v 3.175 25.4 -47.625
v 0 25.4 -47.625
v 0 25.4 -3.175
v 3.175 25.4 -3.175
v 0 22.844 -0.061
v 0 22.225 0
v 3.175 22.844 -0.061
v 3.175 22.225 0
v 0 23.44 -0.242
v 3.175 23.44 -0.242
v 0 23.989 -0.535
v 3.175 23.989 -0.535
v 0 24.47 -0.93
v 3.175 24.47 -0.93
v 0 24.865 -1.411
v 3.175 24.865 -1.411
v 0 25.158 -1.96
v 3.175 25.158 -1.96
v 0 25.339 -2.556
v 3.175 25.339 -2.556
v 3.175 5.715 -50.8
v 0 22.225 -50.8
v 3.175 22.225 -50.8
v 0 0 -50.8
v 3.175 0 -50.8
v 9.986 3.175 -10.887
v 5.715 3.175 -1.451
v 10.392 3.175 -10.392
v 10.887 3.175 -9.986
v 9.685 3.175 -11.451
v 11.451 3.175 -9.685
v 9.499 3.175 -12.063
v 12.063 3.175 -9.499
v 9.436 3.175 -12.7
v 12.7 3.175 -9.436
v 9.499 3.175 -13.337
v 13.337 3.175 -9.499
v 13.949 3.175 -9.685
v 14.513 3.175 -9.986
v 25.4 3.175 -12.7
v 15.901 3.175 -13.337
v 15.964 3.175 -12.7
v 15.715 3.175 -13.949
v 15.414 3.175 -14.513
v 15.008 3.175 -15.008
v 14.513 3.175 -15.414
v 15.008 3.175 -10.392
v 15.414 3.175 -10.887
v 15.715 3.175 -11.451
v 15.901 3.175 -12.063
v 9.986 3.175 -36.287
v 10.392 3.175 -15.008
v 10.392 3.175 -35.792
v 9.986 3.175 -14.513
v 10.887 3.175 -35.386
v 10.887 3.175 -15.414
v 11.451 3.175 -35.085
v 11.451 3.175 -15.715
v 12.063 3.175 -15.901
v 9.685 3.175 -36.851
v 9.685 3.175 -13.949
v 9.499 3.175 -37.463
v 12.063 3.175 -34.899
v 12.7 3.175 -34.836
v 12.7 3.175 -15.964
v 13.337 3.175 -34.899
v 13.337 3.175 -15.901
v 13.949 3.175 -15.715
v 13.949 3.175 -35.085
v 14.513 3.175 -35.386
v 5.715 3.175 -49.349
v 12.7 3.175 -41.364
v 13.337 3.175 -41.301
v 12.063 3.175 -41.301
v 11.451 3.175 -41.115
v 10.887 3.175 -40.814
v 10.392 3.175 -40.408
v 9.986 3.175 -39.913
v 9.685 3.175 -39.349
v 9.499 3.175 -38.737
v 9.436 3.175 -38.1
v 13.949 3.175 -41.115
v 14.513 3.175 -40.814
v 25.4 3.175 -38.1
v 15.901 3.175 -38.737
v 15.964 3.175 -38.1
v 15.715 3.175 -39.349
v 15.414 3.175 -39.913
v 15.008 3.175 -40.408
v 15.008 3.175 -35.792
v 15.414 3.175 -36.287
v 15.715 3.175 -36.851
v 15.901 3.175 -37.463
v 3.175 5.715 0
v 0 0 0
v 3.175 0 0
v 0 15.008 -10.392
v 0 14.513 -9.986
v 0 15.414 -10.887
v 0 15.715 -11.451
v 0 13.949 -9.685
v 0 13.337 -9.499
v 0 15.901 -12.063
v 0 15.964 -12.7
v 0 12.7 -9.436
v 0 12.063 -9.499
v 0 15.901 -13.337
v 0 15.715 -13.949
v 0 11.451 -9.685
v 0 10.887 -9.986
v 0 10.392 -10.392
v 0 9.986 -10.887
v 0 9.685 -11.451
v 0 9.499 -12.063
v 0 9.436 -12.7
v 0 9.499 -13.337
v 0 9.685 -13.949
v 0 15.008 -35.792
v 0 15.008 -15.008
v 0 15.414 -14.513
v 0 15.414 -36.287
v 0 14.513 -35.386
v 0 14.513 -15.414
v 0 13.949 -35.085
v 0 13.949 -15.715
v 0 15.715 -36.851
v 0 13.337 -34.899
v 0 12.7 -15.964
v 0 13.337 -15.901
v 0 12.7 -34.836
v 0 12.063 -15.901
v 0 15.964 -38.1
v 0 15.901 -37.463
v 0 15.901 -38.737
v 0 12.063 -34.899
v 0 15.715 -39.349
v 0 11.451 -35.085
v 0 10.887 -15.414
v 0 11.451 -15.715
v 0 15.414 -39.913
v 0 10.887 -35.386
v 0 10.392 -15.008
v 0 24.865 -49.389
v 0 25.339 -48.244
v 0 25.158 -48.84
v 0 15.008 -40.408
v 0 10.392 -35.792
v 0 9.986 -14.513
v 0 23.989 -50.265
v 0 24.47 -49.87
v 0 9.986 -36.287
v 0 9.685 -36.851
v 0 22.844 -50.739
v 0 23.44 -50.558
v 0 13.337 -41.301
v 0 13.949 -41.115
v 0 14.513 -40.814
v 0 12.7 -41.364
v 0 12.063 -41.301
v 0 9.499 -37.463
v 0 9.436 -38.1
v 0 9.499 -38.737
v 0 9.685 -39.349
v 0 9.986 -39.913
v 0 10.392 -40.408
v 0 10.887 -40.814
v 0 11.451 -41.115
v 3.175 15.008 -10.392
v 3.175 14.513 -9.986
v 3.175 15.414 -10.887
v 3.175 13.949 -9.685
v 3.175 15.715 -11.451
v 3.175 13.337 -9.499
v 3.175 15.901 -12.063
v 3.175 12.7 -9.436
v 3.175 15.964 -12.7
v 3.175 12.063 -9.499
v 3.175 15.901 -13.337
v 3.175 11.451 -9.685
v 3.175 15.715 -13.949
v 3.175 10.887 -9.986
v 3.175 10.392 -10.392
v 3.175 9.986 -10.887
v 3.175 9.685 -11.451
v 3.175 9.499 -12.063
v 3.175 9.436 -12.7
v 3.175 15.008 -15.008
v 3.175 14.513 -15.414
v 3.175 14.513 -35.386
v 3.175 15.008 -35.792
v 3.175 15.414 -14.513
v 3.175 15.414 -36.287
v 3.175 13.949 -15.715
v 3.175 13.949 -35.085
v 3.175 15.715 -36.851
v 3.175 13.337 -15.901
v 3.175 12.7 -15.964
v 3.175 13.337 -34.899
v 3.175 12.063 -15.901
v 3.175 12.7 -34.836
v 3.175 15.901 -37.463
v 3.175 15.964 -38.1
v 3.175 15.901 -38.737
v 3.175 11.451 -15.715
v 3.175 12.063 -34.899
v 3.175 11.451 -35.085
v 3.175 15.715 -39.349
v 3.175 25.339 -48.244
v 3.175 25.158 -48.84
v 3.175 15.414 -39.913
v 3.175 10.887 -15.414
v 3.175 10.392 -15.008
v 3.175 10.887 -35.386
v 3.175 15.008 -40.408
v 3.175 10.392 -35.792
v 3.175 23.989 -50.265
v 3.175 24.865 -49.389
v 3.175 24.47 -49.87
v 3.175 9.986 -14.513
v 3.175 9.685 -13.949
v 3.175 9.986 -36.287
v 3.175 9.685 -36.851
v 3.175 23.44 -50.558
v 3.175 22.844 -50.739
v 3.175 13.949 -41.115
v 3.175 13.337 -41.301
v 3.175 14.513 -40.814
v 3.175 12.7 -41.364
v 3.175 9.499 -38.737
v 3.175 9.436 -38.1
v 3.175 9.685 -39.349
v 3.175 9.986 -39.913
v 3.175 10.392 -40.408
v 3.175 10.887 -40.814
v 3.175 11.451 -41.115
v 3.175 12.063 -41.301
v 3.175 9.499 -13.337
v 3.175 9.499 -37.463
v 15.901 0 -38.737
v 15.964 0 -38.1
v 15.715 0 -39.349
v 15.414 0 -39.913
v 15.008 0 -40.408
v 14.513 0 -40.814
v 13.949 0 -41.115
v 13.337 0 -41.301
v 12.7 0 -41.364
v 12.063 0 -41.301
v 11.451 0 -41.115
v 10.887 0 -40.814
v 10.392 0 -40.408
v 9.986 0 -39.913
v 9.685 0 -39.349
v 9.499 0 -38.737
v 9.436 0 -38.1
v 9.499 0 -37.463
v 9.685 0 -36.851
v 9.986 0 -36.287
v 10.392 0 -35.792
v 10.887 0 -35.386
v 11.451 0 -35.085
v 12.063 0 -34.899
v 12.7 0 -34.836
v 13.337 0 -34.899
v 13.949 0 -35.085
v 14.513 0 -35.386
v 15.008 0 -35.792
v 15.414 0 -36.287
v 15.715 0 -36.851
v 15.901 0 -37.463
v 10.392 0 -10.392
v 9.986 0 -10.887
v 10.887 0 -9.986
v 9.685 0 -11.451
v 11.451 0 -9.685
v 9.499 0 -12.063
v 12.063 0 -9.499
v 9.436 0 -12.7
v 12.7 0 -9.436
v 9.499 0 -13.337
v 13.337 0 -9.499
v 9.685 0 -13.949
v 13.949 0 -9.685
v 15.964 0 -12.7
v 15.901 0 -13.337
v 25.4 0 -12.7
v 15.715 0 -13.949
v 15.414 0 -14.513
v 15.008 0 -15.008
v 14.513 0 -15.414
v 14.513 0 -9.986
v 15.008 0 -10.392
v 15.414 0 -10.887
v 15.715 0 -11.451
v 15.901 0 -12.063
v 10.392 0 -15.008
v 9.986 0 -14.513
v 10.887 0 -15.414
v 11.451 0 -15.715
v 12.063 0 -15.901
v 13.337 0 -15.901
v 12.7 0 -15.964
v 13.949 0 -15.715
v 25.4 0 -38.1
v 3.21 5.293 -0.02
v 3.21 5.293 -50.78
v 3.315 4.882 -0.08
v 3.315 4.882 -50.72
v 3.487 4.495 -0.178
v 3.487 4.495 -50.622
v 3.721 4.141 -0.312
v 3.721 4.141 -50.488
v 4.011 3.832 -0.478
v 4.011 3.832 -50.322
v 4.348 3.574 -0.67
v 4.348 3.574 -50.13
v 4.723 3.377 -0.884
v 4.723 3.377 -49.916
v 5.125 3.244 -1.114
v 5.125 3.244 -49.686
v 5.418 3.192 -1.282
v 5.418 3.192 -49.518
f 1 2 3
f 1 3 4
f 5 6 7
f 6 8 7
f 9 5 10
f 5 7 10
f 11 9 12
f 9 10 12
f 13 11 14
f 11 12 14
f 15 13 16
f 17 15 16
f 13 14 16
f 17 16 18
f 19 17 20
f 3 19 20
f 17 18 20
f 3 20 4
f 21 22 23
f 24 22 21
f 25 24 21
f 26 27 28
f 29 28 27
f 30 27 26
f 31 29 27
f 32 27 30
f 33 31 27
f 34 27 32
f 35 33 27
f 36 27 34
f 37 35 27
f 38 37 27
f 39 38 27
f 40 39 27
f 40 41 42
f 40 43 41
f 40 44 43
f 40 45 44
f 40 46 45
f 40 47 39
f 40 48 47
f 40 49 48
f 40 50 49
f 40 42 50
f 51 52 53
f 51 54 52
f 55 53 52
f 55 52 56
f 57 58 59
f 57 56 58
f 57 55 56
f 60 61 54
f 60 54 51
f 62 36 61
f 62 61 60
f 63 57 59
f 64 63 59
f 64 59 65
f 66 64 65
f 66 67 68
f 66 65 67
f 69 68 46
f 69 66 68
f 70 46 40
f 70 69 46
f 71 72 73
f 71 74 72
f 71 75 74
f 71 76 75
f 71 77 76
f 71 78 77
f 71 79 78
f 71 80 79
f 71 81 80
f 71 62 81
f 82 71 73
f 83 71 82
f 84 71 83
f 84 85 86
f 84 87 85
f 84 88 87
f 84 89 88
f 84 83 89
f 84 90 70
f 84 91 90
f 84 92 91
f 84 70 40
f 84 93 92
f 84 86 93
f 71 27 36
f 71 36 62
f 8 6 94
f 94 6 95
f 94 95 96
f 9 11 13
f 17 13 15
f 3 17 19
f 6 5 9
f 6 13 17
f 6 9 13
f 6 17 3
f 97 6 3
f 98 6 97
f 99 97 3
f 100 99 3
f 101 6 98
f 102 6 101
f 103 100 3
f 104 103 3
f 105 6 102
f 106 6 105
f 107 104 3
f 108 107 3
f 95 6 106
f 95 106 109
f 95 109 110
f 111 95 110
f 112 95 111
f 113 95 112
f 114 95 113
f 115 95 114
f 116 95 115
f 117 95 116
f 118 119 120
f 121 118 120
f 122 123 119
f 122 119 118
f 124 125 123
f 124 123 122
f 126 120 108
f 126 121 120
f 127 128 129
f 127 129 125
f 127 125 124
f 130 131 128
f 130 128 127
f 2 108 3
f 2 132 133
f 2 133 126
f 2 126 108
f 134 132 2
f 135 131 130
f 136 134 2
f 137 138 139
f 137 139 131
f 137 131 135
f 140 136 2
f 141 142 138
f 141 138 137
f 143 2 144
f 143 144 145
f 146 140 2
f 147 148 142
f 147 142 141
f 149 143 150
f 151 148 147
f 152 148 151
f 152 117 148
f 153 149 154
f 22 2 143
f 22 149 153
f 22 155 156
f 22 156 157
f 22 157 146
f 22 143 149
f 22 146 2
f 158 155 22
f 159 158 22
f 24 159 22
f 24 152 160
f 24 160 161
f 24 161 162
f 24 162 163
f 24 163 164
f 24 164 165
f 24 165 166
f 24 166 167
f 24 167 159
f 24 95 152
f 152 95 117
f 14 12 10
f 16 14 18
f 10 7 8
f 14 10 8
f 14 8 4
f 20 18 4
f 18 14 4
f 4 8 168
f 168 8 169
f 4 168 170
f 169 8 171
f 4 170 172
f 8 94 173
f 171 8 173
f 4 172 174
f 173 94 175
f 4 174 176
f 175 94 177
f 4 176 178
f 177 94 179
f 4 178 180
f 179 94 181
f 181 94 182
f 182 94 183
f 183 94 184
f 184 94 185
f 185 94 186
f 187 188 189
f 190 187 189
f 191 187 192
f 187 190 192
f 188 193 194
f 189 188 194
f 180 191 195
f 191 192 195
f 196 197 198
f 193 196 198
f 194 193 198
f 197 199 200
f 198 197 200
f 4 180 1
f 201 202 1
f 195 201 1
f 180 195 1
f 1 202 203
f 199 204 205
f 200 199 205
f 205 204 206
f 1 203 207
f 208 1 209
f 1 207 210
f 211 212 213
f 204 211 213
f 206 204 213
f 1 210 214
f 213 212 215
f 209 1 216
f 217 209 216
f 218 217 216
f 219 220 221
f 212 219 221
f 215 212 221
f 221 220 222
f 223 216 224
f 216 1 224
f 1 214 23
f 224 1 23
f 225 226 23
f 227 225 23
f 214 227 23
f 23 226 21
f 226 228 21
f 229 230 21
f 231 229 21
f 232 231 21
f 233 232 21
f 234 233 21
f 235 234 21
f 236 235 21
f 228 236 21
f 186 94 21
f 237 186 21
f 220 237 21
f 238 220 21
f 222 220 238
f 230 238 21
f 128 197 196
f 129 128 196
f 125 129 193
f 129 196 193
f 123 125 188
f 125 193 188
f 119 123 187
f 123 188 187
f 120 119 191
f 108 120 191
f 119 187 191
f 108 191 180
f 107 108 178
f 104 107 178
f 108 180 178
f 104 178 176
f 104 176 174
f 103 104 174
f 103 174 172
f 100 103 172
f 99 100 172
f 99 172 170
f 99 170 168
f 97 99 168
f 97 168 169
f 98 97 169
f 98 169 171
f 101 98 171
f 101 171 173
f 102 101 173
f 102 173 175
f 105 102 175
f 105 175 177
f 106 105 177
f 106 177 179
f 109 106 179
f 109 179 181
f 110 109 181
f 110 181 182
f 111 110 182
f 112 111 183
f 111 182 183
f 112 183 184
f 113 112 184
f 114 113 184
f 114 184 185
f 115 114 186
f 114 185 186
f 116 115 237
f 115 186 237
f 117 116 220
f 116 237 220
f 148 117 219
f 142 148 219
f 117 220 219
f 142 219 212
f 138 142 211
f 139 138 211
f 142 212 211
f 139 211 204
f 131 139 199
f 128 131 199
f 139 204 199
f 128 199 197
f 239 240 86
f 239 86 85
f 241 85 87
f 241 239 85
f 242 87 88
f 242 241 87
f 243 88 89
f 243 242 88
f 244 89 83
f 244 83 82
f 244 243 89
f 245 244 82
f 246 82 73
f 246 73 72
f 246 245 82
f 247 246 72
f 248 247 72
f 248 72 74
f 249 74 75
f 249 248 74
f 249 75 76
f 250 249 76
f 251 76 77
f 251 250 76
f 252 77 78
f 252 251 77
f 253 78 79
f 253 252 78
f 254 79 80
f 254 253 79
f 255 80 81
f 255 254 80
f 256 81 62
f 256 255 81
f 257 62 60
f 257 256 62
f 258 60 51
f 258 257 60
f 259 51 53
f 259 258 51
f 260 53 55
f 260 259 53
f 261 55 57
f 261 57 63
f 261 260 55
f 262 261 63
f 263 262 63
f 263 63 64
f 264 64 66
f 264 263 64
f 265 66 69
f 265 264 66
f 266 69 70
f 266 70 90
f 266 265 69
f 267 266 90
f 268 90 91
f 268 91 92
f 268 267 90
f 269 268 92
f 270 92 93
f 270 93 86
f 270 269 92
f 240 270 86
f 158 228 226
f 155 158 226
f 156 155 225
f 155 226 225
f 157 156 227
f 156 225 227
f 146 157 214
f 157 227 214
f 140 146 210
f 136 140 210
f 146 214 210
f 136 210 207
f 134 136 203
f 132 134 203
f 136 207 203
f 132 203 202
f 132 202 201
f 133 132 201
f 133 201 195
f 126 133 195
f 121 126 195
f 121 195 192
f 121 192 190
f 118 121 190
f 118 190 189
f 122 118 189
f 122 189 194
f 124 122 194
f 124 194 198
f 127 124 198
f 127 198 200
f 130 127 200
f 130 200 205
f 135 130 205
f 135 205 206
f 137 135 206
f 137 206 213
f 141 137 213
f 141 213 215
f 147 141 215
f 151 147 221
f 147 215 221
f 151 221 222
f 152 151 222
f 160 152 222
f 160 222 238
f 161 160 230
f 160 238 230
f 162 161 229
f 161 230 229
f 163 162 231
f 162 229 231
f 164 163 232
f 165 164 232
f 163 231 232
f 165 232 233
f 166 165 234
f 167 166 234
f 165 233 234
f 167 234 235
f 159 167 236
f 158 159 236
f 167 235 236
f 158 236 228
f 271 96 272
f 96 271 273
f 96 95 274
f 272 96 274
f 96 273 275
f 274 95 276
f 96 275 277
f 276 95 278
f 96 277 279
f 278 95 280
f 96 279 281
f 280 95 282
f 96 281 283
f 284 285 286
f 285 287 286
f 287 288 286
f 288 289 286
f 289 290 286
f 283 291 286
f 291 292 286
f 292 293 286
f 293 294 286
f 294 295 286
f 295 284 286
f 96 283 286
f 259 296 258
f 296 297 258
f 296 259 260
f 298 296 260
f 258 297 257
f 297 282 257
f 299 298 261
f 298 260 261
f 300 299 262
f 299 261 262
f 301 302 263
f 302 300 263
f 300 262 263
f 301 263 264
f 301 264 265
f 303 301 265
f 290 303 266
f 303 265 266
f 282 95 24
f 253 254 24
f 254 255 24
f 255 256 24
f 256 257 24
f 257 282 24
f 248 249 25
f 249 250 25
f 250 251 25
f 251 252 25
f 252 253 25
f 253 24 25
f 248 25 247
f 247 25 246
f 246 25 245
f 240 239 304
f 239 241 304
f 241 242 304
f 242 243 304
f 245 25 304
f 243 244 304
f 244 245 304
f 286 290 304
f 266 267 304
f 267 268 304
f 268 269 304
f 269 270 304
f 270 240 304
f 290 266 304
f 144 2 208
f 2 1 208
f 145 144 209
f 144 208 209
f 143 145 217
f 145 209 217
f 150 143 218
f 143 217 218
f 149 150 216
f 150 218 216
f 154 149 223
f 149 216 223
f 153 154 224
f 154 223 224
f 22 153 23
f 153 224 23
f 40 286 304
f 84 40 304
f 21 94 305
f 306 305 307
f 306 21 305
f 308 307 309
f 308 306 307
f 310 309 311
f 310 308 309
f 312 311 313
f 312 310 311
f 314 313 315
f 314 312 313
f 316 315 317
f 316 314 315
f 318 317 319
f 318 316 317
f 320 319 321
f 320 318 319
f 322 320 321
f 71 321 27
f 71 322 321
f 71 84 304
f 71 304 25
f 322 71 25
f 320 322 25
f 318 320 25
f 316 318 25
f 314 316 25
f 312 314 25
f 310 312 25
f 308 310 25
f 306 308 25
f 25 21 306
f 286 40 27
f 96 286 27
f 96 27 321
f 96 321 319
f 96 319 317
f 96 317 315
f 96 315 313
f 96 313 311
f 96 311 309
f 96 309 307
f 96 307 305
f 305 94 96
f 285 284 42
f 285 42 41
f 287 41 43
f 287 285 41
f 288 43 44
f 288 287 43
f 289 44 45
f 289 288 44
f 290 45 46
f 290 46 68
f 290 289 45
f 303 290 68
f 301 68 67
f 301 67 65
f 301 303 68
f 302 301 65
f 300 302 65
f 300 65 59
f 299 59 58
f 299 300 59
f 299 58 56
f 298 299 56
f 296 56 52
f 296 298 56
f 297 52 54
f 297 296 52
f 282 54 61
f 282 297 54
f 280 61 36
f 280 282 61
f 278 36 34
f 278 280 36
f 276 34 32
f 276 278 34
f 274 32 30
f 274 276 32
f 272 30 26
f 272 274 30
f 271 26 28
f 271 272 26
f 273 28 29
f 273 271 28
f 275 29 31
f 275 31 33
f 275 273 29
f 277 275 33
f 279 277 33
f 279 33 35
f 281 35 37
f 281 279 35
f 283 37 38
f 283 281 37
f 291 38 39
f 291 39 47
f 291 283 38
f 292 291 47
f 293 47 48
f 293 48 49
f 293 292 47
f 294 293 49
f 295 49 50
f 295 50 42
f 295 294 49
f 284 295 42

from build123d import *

# Parameters (mm, degrees)
SKETCH1_W               = 25.4
SKETCH1_H               = 50.8
SKETCH1_R               = 3.2639
BOSS_EXTRUDE1_DEPTH     = 3.175
SKETCH2_W               = 3.175
SKETCH2_H               = 50.8
BOSS_EXTRUDE2_DEPTH     = 22.225
SKETCH3_R               = 3.2639
CUT_EXTRUDE1_DEPTH      = 22.225
FILLET2_R               = 2.54
CUT_EXTRUDE3_DEPTH      = 23.225
CUT_EXTRUDE3_DEPTH_BACK = 4.175
FILLET3_R               = 3.175
FILLET4_R               = 3.175


with BuildPart() as part:
    # Sketch1 → Boss-Extrude1 (new body)
    with BuildSketch(Plane(origin=(0, 0, 0), x_dir=(1, 0, 0), z_dir=(0, 1, 0))):
        with Locations((12.7, 25.4)):
            Rectangle(SKETCH1_W, SKETCH1_H)
        with Locations((12.7, 38.1)):
            Circle(SKETCH1_R, mode=Mode.SUBTRACT)
        with Locations((12.7, 12.7)):
            Circle(SKETCH1_R, mode=Mode.SUBTRACT)
    extrude(amount=BOSS_EXTRUDE1_DEPTH)

    # Sketch2 → Boss-Extrude2 (add)
    with BuildSketch(Plane(origin=(0, 3.175, 0), x_dir=(1, 0, 0), z_dir=(0, 1, 0))):
        with Locations((1.5875, 25.4)):
            Rectangle(SKETCH2_W, SKETCH2_H)
    extrude(amount=BOSS_EXTRUDE2_DEPTH)

    # Sketch3 → Cut-Extrude1 (cut)
    with BuildSketch(Plane(origin=(3.175, 0, 0), x_dir=(0, 0, -1), z_dir=(1, 0, 0))):
        with Locations((12.7, 12.7)):
            Circle(SKETCH3_R)
        with Locations((38.1, 12.7)):
            Circle(SKETCH3_R)
    extrude(amount=-CUT_EXTRUDE1_DEPTH, mode=Mode.SUBTRACT)

    # Fillet2
    fillet2_edges = [part.edges().sort_by_distance(p)[0] for p in [
        (3.175, 3.175, -25.4),
    ]]
    fillet(fillet2_edges, radius=FILLET2_R)

    # Sketch4 → Cut-Extrude3 (cut, two sides)
    with BuildSketch(Plane(origin=(0, 3.175, 0), x_dir=(1, 0, 0), z_dir=(0, 1, 0))) as cut_extrude3_sk:
        Polygon((25.4, 0), (25.4, 12.7), (3.175, 0), align=None)
        Polygon((25.4, 50.8), (25.4, 38.1), (3.175, 50.8), align=None)
    extrude(amount=CUT_EXTRUDE3_DEPTH, mode=Mode.SUBTRACT)
    extrude(cut_extrude3_sk.sketch, amount=-CUT_EXTRUDE3_DEPTH_BACK, mode=Mode.SUBTRACT)

    # Fillet3
    fillet3_edges = [part.edges().sort_by_distance(p)[0] for p in [
        (1.5875, 25.4, 0),
    ]]
    fillet(fillet3_edges, radius=FILLET3_R)

    # Fillet4
    fillet4_edges = [part.edges().sort_by_distance(p)[0] for p in [
        (1.5875, 25.4, -50.8),
    ]]
    fillet(fillet4_edges, radius=FILLET4_R)


solid = part.part
